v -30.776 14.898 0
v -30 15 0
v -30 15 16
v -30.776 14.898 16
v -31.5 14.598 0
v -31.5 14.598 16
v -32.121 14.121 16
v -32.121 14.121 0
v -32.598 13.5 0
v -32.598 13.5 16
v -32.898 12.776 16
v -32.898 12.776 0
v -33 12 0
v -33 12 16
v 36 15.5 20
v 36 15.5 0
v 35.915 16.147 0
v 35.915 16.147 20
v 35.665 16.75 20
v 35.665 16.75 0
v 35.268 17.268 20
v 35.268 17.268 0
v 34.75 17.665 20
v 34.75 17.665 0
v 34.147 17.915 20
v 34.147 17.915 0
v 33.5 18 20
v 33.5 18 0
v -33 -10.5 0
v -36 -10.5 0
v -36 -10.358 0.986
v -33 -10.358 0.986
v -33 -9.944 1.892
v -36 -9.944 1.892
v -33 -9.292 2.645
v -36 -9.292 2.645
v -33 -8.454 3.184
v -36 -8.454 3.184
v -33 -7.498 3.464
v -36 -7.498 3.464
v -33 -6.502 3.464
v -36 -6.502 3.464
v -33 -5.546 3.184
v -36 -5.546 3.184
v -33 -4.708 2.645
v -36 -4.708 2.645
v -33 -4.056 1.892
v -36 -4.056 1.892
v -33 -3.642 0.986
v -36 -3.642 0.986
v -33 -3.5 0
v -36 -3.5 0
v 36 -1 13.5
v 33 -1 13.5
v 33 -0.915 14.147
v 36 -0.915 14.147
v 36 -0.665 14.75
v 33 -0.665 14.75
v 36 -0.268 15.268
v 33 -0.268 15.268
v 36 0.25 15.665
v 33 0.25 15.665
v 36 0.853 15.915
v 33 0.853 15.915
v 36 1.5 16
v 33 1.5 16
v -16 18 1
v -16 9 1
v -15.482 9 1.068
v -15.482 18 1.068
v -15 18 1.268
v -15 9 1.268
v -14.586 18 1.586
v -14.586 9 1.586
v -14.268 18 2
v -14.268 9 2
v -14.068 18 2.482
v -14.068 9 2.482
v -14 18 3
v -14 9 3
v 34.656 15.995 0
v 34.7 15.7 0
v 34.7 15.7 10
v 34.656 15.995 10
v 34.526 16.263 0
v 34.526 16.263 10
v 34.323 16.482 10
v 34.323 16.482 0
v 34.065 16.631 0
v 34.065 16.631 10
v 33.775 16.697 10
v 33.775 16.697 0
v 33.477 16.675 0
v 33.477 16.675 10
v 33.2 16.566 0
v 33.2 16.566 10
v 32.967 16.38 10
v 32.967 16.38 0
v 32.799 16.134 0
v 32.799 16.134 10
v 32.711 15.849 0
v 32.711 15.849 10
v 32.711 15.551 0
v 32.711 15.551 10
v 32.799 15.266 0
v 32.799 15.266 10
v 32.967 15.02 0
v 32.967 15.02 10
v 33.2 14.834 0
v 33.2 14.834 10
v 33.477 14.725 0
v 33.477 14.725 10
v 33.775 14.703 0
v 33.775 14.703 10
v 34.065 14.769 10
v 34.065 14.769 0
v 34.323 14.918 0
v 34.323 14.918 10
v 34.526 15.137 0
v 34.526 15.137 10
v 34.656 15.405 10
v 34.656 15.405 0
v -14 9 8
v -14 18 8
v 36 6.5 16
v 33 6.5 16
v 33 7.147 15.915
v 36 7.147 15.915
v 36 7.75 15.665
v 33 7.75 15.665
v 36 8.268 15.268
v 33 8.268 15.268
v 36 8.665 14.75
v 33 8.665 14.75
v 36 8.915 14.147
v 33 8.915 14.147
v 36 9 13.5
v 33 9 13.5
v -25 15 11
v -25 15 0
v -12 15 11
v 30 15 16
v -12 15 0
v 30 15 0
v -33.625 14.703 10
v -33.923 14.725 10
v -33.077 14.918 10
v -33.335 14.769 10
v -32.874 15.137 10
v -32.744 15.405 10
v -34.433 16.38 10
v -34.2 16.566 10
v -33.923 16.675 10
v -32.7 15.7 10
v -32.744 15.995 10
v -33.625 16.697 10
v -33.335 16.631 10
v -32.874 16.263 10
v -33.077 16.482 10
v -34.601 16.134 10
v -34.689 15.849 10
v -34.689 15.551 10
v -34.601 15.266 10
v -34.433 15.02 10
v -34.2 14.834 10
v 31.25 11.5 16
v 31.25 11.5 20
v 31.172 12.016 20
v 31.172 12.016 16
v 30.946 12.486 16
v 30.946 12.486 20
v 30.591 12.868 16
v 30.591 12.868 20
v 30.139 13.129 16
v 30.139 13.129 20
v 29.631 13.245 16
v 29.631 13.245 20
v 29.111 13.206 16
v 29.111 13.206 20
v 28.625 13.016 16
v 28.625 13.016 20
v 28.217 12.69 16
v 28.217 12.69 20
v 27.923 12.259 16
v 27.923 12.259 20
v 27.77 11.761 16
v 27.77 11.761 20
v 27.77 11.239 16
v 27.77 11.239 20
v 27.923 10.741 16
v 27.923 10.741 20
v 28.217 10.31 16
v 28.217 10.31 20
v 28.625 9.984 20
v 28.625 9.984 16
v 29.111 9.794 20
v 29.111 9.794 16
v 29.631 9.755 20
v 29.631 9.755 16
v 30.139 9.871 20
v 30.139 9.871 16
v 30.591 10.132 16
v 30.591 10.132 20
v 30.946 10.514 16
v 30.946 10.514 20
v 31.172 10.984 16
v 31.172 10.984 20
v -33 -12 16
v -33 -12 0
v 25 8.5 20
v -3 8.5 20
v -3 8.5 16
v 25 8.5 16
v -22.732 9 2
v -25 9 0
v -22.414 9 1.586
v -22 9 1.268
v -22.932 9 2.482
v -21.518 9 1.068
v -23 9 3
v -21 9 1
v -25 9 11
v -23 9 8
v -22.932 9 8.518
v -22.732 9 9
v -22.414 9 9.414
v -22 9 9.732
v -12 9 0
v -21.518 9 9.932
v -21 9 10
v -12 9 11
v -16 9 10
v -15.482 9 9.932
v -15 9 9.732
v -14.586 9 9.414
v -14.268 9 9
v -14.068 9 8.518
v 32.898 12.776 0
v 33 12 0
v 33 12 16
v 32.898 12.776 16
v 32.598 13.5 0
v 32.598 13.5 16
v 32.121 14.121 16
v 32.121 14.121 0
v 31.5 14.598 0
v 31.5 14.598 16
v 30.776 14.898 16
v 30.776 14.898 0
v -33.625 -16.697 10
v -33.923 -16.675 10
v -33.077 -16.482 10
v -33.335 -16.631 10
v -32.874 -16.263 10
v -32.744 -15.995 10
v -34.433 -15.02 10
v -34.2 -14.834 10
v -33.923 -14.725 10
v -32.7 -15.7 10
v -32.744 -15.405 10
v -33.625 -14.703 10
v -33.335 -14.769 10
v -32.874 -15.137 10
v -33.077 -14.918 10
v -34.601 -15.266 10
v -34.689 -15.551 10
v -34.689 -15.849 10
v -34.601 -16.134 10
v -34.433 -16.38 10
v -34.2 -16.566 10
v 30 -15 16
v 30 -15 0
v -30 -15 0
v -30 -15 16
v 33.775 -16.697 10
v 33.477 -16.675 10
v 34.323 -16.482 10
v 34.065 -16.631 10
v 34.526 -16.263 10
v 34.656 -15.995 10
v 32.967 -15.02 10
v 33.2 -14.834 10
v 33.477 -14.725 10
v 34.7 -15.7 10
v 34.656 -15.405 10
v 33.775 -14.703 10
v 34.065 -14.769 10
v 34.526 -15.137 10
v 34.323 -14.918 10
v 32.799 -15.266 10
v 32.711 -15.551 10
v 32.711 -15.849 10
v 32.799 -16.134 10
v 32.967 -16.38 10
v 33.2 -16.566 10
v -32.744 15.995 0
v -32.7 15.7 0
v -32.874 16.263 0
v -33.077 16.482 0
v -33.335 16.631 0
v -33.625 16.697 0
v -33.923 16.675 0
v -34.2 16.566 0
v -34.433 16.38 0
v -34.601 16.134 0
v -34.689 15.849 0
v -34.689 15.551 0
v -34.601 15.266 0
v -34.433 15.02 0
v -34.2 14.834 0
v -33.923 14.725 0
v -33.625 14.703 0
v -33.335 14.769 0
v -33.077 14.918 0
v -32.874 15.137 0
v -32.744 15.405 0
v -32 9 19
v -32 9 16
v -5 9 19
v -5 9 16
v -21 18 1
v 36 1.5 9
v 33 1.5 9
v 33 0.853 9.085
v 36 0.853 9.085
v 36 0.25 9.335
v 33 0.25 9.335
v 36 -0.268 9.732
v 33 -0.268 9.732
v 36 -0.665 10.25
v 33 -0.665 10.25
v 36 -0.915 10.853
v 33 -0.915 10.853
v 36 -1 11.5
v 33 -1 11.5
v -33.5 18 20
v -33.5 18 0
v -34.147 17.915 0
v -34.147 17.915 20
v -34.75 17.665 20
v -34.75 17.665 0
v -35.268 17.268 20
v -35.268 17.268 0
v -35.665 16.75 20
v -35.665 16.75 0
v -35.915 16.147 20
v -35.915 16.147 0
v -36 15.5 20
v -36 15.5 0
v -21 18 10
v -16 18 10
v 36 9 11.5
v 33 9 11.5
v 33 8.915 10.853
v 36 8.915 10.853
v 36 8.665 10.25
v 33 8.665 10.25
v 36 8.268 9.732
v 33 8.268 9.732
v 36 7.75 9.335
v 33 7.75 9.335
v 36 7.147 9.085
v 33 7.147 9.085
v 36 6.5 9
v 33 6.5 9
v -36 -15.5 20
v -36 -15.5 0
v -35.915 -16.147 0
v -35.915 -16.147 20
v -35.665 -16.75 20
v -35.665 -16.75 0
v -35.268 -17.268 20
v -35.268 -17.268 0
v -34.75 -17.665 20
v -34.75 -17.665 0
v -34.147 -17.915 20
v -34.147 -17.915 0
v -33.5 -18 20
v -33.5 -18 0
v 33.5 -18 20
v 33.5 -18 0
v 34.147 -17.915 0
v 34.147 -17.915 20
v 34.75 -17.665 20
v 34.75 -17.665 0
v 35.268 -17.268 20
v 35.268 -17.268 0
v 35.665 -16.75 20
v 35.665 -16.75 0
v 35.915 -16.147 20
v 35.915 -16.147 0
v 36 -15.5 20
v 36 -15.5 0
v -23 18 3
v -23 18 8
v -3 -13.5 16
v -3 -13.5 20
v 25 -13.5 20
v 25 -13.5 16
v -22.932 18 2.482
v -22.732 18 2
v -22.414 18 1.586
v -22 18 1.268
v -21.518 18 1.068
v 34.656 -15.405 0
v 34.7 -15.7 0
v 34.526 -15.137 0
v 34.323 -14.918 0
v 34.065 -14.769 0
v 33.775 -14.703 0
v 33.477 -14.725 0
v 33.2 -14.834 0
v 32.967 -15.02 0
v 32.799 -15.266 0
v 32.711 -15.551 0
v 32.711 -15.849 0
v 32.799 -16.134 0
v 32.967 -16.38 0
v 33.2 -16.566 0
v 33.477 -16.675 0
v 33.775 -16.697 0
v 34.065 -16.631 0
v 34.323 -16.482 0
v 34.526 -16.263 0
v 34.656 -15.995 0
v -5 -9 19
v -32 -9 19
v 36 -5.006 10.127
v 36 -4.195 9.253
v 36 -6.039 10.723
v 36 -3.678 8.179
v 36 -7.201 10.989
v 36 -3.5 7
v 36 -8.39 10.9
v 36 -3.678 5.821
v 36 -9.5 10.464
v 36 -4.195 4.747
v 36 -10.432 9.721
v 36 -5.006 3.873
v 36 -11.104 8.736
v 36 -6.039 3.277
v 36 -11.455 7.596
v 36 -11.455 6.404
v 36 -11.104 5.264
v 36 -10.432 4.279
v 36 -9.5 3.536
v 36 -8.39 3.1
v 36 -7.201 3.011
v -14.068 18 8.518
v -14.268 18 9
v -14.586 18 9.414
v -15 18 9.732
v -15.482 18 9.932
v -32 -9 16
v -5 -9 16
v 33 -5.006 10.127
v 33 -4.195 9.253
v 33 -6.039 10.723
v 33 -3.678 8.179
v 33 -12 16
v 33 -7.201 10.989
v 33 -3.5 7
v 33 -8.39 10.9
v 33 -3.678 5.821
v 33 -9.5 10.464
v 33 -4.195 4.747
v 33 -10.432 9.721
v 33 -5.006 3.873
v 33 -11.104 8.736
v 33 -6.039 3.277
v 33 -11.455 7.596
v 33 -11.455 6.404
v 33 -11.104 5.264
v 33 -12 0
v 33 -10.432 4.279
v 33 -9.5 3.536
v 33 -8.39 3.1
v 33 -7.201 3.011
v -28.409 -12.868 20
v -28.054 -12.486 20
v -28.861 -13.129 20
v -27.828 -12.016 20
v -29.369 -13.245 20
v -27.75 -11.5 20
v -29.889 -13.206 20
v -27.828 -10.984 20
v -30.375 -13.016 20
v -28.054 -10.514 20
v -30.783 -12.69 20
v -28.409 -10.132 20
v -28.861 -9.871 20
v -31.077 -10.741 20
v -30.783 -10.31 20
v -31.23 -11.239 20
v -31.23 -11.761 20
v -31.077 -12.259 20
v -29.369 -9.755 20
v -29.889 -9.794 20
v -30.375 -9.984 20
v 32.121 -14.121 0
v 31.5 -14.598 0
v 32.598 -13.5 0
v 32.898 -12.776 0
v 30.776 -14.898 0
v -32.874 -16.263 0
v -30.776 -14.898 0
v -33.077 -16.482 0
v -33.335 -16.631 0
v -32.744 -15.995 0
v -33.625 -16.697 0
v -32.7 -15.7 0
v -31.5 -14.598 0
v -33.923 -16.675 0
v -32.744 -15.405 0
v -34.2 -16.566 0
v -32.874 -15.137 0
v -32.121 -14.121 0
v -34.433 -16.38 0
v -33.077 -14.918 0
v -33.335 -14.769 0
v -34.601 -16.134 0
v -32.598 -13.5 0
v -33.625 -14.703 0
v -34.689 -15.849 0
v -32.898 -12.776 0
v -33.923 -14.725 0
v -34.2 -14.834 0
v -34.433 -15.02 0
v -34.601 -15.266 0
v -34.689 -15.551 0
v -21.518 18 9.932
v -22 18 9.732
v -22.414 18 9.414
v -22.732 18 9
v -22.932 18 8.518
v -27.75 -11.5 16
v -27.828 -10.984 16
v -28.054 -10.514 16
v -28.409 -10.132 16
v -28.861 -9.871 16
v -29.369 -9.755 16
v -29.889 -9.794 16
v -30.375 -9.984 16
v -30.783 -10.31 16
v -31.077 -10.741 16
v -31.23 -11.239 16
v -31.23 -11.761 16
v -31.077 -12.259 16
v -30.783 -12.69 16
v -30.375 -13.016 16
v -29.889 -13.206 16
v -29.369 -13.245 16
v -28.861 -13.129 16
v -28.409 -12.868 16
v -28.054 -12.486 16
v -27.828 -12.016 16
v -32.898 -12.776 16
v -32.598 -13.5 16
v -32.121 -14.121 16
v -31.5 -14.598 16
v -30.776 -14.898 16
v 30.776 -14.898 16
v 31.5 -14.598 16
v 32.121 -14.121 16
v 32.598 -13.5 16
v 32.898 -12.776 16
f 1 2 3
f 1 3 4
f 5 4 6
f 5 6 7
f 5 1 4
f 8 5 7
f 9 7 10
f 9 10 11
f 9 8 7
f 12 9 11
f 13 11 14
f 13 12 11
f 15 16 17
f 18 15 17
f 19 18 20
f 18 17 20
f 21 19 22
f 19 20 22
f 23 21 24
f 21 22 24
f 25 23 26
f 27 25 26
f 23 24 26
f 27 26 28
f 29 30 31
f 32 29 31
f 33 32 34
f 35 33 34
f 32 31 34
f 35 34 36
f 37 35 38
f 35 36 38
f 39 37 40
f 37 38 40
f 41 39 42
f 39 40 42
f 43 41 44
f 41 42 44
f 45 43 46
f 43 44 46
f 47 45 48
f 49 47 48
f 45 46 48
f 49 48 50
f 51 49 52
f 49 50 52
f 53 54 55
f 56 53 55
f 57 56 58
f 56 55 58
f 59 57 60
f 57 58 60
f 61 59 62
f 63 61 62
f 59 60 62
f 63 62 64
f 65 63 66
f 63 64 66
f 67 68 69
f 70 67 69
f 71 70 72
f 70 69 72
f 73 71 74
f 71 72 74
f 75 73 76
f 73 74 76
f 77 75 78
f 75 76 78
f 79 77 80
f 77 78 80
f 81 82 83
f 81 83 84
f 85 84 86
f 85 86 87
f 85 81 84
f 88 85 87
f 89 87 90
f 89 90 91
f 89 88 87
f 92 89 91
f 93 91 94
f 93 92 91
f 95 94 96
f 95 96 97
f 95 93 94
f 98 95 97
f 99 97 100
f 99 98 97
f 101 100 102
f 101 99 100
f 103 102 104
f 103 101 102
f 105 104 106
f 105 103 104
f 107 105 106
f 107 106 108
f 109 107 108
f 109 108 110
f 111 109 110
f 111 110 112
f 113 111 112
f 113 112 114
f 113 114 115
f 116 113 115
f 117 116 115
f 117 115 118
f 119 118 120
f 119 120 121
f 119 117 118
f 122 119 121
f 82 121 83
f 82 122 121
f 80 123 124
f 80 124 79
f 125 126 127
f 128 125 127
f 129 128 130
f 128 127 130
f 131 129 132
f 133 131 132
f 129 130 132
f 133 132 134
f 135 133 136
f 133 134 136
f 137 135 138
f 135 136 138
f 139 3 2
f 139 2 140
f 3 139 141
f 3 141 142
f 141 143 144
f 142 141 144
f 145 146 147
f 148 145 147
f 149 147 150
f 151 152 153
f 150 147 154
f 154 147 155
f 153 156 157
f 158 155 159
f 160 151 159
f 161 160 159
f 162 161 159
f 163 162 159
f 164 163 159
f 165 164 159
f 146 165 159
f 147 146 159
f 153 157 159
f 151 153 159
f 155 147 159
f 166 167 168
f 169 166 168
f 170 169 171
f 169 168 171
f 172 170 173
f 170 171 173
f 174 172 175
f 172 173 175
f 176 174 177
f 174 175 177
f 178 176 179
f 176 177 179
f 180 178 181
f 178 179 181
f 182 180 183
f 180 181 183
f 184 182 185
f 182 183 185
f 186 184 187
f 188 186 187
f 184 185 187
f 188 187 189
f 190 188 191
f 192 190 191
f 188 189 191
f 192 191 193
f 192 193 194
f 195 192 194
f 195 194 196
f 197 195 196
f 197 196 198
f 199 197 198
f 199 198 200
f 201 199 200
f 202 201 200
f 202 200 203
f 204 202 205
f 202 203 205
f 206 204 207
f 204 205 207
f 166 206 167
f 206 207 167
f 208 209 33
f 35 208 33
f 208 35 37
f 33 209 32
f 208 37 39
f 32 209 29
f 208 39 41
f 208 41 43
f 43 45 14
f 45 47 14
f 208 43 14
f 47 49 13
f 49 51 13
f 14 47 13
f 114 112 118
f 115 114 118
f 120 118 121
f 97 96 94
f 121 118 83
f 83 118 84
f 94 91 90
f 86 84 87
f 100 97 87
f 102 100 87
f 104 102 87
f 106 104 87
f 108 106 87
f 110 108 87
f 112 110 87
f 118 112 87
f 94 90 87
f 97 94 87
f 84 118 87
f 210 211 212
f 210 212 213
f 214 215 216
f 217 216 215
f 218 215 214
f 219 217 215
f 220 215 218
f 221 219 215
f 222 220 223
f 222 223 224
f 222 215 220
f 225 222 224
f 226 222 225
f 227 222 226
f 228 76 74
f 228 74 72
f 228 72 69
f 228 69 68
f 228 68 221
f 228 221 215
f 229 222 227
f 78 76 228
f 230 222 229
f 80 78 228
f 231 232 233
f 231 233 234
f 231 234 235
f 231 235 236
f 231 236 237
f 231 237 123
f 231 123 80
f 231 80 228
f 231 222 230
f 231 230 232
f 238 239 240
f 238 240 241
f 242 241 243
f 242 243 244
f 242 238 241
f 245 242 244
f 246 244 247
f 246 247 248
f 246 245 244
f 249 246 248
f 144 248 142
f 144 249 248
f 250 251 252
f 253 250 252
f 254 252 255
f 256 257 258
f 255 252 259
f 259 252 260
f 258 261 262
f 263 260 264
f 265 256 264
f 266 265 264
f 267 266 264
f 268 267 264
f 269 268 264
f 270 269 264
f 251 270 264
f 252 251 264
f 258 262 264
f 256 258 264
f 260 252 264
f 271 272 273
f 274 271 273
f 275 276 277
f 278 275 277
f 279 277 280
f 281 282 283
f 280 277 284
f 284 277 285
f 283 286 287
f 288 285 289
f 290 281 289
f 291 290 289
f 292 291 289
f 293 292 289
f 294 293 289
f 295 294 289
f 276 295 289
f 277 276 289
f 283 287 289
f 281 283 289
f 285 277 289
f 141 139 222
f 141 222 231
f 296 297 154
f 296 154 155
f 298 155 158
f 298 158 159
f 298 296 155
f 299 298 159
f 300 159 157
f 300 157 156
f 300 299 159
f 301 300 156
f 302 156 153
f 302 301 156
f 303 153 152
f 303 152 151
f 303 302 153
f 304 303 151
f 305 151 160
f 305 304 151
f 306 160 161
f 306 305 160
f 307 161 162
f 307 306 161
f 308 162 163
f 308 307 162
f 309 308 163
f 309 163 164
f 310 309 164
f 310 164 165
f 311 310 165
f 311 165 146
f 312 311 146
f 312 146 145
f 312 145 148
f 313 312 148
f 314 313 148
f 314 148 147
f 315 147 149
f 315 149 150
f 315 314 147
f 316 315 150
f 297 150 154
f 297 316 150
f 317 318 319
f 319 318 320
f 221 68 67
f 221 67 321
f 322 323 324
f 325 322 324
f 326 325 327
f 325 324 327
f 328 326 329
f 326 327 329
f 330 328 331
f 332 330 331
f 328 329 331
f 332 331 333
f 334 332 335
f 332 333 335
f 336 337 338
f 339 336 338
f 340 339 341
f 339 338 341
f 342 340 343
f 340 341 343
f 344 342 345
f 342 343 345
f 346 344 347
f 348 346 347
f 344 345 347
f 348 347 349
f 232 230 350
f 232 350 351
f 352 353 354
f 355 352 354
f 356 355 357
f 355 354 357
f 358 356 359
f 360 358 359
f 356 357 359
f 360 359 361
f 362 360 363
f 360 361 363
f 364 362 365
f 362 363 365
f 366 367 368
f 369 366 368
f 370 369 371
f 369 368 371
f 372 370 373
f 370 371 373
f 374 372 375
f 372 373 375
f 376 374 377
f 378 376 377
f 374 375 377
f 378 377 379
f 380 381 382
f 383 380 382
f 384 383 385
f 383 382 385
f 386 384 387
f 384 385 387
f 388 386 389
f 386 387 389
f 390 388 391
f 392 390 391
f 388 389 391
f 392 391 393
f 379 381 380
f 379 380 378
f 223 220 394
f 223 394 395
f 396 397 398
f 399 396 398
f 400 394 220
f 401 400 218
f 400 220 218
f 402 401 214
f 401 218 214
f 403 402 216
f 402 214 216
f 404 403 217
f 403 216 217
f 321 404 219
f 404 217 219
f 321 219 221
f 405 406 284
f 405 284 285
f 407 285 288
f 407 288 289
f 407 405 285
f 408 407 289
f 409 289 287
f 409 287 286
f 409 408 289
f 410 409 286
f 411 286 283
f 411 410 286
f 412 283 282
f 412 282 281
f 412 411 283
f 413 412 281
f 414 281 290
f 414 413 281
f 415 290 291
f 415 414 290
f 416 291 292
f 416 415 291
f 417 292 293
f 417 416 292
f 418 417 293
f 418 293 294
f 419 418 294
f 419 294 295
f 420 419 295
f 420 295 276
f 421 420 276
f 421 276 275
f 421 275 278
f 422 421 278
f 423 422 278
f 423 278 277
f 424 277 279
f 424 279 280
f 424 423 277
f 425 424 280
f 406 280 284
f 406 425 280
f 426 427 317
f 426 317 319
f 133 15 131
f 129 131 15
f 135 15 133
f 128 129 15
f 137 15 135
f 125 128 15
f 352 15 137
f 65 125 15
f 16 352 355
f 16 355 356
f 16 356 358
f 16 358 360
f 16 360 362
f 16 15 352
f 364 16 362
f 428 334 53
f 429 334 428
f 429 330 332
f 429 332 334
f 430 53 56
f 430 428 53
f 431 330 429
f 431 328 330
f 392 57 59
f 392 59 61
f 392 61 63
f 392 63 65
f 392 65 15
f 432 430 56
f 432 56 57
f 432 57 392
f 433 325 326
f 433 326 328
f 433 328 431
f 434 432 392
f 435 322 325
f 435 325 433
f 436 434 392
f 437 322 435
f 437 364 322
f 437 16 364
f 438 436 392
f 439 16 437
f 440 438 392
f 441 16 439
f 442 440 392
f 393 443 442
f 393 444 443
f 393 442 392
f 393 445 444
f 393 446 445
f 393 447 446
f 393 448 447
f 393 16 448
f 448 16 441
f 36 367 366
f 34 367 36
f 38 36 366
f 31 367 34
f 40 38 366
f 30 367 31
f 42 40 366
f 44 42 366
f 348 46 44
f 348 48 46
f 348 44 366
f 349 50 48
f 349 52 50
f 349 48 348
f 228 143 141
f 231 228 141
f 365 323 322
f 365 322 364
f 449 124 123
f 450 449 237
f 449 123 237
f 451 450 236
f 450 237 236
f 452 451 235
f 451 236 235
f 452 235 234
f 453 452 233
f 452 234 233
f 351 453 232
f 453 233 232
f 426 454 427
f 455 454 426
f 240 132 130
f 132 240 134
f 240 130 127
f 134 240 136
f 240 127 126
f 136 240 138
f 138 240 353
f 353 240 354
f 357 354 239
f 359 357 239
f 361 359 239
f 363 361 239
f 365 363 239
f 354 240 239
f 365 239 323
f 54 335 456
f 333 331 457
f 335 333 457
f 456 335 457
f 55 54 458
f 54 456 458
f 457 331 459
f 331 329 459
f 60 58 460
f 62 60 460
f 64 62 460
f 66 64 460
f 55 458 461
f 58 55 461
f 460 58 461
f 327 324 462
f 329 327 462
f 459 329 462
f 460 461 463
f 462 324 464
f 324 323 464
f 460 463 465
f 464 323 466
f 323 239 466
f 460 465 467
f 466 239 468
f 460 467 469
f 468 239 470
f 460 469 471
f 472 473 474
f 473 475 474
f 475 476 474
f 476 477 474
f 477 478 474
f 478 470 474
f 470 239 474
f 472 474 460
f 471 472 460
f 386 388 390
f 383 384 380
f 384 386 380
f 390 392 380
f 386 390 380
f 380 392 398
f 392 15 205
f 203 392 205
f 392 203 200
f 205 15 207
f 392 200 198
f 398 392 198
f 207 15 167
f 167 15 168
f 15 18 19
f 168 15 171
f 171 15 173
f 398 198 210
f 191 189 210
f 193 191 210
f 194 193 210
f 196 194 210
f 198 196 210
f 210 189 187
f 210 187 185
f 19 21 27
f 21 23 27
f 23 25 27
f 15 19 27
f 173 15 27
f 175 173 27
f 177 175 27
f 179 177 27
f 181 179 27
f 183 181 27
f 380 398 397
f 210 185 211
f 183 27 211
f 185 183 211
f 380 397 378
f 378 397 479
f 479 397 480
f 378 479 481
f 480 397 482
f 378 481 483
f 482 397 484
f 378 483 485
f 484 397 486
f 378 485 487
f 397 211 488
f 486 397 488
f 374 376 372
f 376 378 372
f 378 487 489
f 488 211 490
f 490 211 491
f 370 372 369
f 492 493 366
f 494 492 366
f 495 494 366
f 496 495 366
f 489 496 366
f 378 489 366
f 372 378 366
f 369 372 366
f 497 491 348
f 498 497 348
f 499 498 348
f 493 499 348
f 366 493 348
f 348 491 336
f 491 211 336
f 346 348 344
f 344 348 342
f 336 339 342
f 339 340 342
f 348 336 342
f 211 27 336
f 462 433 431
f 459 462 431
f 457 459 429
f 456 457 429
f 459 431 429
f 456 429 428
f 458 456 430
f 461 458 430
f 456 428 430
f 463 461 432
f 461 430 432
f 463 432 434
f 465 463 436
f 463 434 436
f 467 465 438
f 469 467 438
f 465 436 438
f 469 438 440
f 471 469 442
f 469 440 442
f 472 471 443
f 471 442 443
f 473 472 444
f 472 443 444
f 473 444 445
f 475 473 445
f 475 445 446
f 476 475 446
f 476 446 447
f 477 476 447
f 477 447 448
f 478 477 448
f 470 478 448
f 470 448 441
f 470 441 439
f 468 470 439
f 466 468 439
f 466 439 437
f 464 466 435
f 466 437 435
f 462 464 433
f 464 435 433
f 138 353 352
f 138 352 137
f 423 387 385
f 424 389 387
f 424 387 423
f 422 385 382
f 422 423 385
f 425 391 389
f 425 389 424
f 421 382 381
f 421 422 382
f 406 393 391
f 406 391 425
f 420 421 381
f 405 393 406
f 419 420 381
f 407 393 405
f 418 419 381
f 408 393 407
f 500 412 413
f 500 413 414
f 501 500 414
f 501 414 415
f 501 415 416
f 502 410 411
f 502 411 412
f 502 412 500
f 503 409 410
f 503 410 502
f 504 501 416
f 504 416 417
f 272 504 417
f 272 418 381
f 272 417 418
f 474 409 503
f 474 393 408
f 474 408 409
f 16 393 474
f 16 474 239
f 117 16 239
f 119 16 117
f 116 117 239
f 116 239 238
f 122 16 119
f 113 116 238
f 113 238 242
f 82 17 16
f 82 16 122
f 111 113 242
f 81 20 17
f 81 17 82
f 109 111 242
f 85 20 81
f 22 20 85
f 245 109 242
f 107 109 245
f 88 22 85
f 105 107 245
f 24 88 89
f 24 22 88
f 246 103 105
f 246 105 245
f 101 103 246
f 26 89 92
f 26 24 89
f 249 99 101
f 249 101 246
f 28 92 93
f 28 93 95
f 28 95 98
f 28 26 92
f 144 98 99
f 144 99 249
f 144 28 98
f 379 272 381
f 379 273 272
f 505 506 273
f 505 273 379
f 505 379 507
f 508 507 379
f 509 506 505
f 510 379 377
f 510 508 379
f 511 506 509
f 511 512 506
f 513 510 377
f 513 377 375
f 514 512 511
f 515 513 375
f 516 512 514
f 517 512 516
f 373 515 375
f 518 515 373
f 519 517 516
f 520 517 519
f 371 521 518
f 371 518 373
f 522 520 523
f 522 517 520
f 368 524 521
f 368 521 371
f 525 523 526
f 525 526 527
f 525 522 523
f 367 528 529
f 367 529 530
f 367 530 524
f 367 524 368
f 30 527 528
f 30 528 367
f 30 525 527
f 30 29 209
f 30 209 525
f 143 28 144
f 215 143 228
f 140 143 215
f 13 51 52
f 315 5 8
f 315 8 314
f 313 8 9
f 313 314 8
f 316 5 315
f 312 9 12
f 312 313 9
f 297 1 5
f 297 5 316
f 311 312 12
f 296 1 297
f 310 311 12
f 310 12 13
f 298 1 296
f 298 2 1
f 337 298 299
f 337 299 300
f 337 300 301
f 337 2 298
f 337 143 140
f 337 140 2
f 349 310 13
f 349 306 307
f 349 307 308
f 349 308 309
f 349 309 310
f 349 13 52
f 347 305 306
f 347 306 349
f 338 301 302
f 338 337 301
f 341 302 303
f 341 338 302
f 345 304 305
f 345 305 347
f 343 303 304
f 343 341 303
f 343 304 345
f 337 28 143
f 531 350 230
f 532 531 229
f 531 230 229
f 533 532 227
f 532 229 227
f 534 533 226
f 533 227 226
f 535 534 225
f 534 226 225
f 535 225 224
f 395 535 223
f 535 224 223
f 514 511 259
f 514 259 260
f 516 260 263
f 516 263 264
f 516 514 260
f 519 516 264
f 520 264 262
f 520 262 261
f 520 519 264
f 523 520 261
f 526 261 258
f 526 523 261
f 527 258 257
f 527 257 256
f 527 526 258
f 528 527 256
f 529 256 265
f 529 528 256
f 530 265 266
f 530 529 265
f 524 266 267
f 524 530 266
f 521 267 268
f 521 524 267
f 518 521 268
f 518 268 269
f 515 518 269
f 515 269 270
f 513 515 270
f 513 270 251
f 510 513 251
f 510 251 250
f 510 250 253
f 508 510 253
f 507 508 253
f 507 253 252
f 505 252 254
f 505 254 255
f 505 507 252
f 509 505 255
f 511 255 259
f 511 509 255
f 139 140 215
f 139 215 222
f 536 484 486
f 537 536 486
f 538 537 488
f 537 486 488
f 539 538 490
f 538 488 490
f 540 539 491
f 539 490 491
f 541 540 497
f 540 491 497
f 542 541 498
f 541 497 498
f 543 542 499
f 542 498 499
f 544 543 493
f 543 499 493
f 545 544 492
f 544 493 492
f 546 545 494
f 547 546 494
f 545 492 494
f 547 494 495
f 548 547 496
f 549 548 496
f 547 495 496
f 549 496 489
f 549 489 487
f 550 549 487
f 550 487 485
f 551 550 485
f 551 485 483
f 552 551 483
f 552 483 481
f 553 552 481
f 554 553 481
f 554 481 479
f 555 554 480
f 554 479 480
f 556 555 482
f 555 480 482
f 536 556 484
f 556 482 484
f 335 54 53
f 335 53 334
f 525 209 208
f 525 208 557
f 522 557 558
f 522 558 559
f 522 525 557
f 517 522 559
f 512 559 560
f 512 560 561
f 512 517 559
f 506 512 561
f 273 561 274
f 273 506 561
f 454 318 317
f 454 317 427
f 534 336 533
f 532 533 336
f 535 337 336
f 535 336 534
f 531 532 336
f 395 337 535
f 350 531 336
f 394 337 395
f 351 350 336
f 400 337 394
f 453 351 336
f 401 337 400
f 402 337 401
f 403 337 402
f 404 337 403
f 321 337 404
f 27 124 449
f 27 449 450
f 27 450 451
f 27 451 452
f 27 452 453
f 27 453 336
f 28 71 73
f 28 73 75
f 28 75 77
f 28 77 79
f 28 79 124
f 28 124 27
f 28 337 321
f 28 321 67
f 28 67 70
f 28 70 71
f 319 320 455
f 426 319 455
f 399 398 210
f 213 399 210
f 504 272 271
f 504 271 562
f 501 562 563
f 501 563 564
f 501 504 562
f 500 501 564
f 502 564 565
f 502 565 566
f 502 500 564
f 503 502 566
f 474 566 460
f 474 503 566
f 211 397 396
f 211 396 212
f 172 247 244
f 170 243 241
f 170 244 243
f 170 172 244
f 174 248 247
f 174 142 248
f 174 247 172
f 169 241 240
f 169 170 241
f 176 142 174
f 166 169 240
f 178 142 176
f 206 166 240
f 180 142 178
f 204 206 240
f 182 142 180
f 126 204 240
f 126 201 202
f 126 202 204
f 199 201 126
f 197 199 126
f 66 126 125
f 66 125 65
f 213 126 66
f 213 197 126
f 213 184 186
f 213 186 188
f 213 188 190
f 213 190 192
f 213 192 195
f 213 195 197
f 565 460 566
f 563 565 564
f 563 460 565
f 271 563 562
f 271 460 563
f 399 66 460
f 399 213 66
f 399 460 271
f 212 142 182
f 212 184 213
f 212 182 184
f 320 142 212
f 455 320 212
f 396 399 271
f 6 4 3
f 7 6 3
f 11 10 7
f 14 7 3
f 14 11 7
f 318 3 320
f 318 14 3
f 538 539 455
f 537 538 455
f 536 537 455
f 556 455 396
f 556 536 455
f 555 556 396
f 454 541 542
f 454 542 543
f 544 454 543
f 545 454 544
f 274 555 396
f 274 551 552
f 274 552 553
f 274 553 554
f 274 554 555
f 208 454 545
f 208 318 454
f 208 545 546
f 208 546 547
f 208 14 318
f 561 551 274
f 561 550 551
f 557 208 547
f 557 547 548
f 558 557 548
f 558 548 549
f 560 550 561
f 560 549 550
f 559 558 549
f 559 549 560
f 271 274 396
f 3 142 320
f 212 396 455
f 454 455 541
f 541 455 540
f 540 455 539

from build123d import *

# Parameters (mm, degrees)
PAD_DEPTH            = 20
POCKET_DEPTH         = 16
SKETCH002_R          = 1.75
SKETCH002_W          = 28
SKETCH002_H          = 22
POCKET001_DEPTH      = 4
POCKET002_DEPTH      = 3
SKETCH004_W          = 27
SKETCH004_H          = 18
POCKET003_DEPTH      = 3
SKETCH005_R          = 1
POCKET004_DEPTH      = 10
SKETCH007_W          = 13
SKETCH007_H          = 11
PAD001_DEPTH         = 6
POCKET005_DEPTH      = 5
POCKET005_DEPTH_BACK = 10
SKETCH008_R          = 4
POCKET006_DEPTH      = 3
SKETCH009_R          = 3.5
POCKET007_DEPTH      = 3


with BuildPart() as part:
    # Sketch001 (on Sketch) → Pad (new body)
    with BuildSketch(Plane.XY):
        with BuildLine():
            Line((-33.5, 18), (33.5, 18))
            ThreePointArc((36, 15.5), (35.267767, 17.267767), (33.5, 18))
            Line((36, 15.5), (36, -15.5))
            ThreePointArc((33.5, -18), (35.267767, -17.267767), (36, -15.5))
            Line((33.5, -18), (-33.5, -18))
            ThreePointArc((-36, -15.5), (-35.267767, -17.267767), (-33.5, -18))
            Line((-36, -15.5), (-36, 15.5))
            ThreePointArc((-33.5, 18), (-35.267767, 17.267767), (-36, 15.5))
        make_face()
    extrude(amount=PAD_DEPTH)

    # Sketch → Pocket (cut)
    with BuildSketch(Plane.XY):
        with BuildLine():
            Line((-30, 15), (30, 15))
            ThreePointArc((33, 12), (32.12132, 14.12132), (30, 15))
            Line((33, 12), (33, -12))
            ThreePointArc((30, -15), (32.12132, -14.12132), (33, -12))
            Line((30, -15), (-30, -15))
            ThreePointArc((-33, -12), (-32.12132, -14.12132), (-30, -15))
            Line((-33, -12), (-33, 12))
            ThreePointArc((-30, 15), (-32.12132, 14.12132), (-33, 12))
        make_face()
    extrude(amount=POCKET_DEPTH, mode=Mode.SUBTRACT)

    # Sketch002 (on Sketch) → Pocket001 (cut)
    with BuildSketch(Plane.XY.offset(20)):
        with Locations((-29.5, -11.5)):
            Circle(SKETCH002_R)
        with Locations((29.5, 11.5)):
            Circle(SKETCH002_R)
        with Locations((11, -2.5)):
            Rectangle(SKETCH002_W, SKETCH002_H)
    extrude(amount=-POCKET001_DEPTH, mode=Mode.SUBTRACT)

    # Sketch003 (on Face15 of Pocket001) → Pocket002 (cut)
    with BuildSketch(Plane(origin=(33, 0, 0), x_dir=(0, -1, 0), z_dir=(-1, 0, 0))):
        with BuildLine():
            Line((-6.5, 16), (-1.5, 16))
            ThreePointArc((1, 13.5), (0.267767, 15.267767), (-1.5, 16))
            Line((1, 13.5), (1, 11.5))
            ThreePointArc((-1.5, 9), (0.267767, 9.732233), (1, 11.5))
            Line((-1.5, 9), (-6.5, 9))
            ThreePointArc((-9, 11.5), (-8.267767, 9.732233), (-6.5, 9))
            Line((-9, 11.5), (-9, 13.5))
            ThreePointArc((-6.5, 16), (-8.267767, 15.267767), (-9, 13.5))
        make_face()
    extrude(amount=-POCKET002_DEPTH, mode=Mode.SUBTRACT)

    # Sketch004 (on Face33 of Pocket002) → Pocket003 (cut)
    with BuildSketch(Plane(origin=(0, 0, 16), x_dir=(1, 0, 0), z_dir=(0, 0, -1))):
        with Locations((-18.5, 0)):
            Rectangle(SKETCH004_W, SKETCH004_H)
    extrude(amount=-POCKET003_DEPTH, mode=Mode.SUBTRACT)

    # Sketch005 → Pocket004 (cut)
    with BuildSketch(Plane.XY):
        with Locations((-33.7, -15.7)):
            Circle(SKETCH005_R)
        with Locations((33.7, -15.7)):
            Circle(SKETCH005_R)
        with Locations((33.7, 15.7)):
            Circle(SKETCH005_R)
        with Locations((-33.7, 15.7)):
            Circle(SKETCH005_R)
    extrude(amount=POCKET004_DEPTH, mode=Mode.SUBTRACT)

    # Sketch007 (on Face18 of Pocket004) → Pad001 (join)
    with BuildSketch(Plane.XZ.offset(-15)):
        with Locations((-18.5, 5.5)):
            Rectangle(SKETCH007_W, SKETCH007_H)
    extrude(amount=PAD001_DEPTH)

    # Sketch006 (on Face18 of Pocket004) → Pocket005 (cut, two sides)
    with BuildSketch(Plane.XZ.offset(-15)) as pocket005_sk:
        with BuildLine():
            Line((-21, 10), (-16, 10))
            ThreePointArc((-14, 8), (-14.585786, 9.414214), (-16, 10))
            Line((-14, 8), (-14, 3))
            ThreePointArc((-16, 1), (-14.585786, 1.585786), (-14, 3))
            Line((-16, 1), (-21, 1))
            ThreePointArc((-23, 3), (-22.414214, 1.585786), (-21, 1))
            Line((-23, 3), (-23, 8))
            ThreePointArc((-21, 10), (-22.414214, 9.414214), (-23, 8))
        make_face()
    extrude(amount=-POCKET005_DEPTH, mode=Mode.SUBTRACT)
    extrude(pocket005_sk.sketch, amount=POCKET005_DEPTH_BACK, mode=Mode.SUBTRACT)

    # Sketch008 → Pocket006 (cut)
    with BuildSketch(Plane.YZ.offset(36)):
        with Locations((-7.5, 7)):
            Circle(SKETCH008_R)
    extrude(amount=-POCKET006_DEPTH, mode=Mode.SUBTRACT)

    # Sketch009 (on Face1 of Pocket006) → Pocket007 (cut)
    with BuildSketch(Plane(origin=(-36, 0, 0), x_dir=(0, -1, 0), z_dir=(-1, 0, 0))):
        with Locations((7, 0)):
            Circle(SKETCH009_R)
    extrude(amount=-POCKET007_DEPTH, mode=Mode.SUBTRACT)


solid = part.part
